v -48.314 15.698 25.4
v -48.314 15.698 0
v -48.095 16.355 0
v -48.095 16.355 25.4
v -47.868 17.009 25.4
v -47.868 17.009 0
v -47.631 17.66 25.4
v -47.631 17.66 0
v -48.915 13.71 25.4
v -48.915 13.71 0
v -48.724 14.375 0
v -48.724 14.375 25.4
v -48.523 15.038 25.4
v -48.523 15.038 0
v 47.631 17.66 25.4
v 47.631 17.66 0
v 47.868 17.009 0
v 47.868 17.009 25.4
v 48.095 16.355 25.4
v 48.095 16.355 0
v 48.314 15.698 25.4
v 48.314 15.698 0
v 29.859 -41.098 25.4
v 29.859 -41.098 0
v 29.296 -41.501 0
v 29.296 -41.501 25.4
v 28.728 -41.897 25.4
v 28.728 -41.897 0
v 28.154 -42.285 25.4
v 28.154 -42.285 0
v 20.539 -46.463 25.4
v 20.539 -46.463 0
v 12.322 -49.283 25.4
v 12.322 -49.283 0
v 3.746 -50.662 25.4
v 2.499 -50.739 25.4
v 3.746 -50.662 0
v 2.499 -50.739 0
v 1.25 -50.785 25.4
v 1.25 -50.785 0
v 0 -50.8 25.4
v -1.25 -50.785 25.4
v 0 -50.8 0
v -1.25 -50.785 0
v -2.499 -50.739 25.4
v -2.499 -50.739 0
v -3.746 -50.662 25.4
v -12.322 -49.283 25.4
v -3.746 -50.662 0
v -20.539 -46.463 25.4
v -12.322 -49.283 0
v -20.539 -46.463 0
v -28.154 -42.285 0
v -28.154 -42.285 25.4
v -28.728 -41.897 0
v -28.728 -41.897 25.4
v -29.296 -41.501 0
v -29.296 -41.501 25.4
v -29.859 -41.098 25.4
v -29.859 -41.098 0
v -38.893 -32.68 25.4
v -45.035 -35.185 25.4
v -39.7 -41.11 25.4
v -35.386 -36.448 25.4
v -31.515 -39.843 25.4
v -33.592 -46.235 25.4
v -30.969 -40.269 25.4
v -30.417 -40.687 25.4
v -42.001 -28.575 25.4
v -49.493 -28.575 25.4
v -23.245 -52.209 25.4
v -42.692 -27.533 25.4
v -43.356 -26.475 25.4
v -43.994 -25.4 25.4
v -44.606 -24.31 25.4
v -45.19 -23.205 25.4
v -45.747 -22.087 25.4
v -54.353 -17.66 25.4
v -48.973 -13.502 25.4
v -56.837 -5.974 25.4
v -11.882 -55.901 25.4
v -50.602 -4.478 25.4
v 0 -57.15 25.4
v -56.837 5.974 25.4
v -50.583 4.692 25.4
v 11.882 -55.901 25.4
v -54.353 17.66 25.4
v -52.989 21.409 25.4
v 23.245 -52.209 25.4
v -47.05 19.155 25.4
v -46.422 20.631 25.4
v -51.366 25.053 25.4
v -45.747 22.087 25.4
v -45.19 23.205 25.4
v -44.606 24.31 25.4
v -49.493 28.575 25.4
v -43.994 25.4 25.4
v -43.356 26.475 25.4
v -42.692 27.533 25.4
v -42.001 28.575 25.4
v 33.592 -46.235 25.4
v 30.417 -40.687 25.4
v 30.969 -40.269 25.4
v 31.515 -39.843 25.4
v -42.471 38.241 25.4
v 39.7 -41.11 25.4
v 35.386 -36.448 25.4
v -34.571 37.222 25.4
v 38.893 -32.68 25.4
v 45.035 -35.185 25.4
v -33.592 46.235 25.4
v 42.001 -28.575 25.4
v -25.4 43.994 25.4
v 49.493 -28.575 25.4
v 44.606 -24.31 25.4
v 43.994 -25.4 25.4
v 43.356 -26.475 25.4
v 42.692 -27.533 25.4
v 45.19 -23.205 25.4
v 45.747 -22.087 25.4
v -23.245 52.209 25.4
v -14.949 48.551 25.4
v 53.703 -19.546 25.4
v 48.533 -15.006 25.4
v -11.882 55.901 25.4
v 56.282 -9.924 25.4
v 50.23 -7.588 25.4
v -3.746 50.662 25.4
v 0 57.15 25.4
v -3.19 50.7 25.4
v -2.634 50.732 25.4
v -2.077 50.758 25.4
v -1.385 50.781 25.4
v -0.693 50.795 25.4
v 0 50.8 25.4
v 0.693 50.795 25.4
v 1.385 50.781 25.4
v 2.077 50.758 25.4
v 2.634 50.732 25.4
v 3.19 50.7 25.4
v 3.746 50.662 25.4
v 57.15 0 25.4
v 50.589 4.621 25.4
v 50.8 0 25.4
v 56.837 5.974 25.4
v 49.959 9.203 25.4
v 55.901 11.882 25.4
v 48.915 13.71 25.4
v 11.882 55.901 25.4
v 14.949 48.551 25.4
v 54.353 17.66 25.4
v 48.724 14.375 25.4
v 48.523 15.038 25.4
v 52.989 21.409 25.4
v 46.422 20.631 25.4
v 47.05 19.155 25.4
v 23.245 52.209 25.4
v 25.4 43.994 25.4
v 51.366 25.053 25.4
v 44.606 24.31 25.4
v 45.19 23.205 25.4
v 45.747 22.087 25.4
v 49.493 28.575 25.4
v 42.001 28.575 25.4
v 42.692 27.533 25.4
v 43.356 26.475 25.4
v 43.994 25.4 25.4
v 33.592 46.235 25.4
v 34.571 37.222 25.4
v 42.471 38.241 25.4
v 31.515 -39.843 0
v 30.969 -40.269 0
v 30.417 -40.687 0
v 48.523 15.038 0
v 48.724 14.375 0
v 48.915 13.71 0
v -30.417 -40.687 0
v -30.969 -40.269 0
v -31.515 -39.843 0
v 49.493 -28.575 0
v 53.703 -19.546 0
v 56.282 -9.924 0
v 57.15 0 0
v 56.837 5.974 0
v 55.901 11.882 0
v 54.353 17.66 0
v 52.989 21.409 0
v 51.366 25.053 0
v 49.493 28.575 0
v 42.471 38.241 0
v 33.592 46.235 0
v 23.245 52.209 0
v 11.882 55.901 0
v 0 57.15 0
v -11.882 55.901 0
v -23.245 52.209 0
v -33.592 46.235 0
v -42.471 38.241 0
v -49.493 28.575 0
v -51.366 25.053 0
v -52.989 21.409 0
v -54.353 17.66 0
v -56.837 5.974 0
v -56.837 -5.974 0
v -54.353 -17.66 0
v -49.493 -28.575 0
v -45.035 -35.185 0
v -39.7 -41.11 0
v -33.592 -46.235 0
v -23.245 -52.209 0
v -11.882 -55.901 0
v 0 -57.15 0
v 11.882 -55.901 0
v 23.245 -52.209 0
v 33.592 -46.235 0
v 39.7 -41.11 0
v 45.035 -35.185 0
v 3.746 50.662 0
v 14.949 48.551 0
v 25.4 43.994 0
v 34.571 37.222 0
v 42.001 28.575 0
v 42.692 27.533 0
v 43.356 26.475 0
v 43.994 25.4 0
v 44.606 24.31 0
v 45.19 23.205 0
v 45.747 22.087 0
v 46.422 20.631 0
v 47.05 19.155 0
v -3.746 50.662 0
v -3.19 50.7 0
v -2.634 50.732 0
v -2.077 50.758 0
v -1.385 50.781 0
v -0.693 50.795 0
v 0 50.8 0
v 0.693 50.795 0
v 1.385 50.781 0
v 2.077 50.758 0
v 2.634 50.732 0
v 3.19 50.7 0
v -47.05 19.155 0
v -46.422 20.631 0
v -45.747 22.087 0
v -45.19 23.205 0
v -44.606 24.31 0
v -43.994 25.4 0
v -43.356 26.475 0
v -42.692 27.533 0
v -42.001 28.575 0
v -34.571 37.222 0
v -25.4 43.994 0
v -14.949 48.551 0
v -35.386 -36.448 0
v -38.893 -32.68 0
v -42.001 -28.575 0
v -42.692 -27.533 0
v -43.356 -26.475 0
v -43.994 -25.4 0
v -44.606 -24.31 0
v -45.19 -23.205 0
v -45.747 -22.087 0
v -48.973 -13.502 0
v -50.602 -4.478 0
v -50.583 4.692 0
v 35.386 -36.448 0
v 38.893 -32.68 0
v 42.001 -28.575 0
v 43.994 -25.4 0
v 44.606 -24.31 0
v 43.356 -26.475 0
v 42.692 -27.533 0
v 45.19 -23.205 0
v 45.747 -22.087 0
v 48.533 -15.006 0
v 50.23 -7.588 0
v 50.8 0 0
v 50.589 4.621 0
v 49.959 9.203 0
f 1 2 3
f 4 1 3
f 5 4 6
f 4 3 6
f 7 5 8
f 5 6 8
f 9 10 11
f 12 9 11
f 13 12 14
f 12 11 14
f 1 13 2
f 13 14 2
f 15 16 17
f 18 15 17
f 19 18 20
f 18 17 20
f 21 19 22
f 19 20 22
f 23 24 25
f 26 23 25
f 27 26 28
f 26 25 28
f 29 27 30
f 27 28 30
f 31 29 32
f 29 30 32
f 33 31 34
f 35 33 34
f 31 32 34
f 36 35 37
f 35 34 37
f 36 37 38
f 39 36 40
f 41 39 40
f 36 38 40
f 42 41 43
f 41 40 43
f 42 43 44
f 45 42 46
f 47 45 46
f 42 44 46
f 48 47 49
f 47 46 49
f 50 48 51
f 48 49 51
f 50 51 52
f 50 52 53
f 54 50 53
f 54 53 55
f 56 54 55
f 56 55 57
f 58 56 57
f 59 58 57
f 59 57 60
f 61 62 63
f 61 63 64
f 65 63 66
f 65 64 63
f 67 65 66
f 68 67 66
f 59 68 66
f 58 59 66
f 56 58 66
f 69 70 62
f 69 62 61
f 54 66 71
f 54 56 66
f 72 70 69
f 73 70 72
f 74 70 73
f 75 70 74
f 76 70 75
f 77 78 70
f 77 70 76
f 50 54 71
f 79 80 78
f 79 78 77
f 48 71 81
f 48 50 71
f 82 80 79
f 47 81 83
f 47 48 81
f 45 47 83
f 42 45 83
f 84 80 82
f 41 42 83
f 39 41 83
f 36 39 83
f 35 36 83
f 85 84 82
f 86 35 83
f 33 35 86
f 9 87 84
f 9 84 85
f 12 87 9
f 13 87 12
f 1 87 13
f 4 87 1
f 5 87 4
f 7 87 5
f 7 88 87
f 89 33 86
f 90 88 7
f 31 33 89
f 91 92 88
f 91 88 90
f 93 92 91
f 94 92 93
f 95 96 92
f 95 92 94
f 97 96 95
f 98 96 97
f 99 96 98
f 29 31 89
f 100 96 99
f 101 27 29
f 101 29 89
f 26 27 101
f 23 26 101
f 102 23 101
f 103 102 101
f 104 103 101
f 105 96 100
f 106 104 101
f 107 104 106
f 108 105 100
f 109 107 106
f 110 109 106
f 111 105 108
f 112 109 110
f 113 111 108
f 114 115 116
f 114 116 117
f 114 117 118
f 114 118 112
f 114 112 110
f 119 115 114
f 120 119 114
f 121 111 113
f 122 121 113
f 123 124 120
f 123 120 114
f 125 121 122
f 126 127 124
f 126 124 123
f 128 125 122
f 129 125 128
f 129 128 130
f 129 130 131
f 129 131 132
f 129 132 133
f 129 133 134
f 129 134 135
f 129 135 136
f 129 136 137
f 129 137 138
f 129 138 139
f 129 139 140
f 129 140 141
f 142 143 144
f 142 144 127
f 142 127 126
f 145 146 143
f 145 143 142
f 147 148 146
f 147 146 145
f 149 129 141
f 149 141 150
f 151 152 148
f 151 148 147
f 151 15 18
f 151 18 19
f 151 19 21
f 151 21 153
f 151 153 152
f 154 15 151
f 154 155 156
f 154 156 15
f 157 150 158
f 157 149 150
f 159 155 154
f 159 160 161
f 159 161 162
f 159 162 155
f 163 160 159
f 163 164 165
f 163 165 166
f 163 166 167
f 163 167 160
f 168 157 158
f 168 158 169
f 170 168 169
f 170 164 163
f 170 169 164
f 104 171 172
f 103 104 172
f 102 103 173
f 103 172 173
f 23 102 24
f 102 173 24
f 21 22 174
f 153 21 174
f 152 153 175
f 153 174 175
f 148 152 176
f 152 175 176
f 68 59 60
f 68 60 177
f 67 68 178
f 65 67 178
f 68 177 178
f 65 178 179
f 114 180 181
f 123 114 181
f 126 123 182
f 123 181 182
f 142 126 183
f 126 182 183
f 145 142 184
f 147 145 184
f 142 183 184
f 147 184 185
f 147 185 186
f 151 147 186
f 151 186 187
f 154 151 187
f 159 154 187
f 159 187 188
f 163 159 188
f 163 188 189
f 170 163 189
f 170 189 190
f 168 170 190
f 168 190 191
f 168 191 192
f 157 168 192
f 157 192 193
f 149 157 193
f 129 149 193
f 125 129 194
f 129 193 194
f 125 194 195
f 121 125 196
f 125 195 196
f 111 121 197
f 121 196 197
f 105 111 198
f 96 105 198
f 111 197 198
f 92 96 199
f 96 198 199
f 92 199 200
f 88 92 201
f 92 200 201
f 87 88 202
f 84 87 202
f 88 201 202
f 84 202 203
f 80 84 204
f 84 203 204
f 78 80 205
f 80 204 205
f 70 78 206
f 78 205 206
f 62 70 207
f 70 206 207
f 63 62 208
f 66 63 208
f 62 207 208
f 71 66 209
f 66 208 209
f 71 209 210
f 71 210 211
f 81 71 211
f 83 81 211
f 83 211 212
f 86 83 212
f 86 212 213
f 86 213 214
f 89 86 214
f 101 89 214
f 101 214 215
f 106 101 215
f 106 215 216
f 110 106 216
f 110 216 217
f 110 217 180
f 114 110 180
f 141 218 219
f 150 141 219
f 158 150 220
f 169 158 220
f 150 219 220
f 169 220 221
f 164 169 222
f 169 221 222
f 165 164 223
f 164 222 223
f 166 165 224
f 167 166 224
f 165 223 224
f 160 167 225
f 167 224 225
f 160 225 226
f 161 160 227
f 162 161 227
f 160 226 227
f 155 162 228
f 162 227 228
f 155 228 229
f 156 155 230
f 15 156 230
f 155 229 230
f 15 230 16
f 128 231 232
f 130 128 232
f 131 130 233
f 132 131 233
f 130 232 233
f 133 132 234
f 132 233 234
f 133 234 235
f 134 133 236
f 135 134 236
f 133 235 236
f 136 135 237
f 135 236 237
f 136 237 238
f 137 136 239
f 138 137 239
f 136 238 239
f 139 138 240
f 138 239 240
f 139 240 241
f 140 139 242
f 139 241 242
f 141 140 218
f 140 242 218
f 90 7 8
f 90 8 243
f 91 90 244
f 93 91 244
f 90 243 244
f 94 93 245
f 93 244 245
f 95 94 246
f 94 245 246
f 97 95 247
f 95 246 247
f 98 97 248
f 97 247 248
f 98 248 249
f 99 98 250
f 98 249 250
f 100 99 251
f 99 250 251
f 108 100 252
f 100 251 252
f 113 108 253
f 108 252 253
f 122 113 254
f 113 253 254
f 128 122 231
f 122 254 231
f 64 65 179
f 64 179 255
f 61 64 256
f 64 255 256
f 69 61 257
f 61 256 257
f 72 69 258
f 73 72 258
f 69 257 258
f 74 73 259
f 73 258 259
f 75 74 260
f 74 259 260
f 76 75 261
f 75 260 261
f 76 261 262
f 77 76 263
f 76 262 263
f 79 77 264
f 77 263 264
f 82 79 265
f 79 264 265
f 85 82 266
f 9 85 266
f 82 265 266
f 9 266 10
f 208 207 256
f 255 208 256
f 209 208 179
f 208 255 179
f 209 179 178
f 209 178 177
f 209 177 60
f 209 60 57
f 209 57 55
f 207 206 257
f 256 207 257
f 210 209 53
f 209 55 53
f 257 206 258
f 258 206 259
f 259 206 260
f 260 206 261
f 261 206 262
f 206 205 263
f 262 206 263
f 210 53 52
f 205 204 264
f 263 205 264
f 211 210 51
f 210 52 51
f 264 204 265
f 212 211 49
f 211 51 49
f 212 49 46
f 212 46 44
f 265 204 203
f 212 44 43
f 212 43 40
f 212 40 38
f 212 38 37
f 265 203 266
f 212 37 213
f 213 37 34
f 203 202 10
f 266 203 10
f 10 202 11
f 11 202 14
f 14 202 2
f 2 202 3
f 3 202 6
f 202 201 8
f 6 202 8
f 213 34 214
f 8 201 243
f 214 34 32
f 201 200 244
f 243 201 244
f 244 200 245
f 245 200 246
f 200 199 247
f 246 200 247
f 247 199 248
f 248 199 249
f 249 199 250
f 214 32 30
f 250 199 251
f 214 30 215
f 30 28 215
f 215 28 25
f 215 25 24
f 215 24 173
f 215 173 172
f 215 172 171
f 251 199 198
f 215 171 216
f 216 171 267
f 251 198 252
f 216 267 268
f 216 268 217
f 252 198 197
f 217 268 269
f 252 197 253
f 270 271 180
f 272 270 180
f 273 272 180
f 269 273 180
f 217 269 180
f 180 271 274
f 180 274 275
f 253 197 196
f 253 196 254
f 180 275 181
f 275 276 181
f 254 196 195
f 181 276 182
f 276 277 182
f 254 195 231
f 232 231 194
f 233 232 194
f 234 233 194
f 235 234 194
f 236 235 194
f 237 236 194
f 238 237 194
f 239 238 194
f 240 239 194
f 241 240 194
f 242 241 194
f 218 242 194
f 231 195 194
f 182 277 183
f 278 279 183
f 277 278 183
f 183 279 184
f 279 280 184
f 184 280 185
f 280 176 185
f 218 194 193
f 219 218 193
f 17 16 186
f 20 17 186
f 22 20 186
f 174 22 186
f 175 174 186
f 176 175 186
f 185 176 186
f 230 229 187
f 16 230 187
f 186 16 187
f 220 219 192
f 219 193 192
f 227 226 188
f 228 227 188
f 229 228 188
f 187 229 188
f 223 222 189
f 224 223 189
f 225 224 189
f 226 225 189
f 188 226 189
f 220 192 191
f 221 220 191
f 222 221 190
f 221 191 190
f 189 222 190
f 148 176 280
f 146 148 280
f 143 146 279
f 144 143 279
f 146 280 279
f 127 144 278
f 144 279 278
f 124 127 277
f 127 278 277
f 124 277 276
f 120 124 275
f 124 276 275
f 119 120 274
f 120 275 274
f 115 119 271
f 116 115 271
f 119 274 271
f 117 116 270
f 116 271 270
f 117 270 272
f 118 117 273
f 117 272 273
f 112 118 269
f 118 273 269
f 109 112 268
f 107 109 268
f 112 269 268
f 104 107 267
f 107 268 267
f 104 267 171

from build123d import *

# Parameters (mm, degrees)
F1_DEPTH = 2.54
F2_DEPTH = 25.4


with BuildPart() as f1:
    # F0 (on Top) → F1 (new body)
    with BuildSketch(Plane.XY):
        with BuildLine():
            ThreePointArc((48.915112113, 13.7095516693), (50.3265719841, 6.9192595218), (50.8, 0))
            ThreePointArc((50.8, 0), (49.520723989, -11.328631674), (45.7473269447, -22.0866945787))
            Line((45.7473269447, -22.0866945787), (49.4933518263, -28.575))
            ThreePointArc((49.4933518263, -28.575), (55.2026609724, -14.7915084276), (57.15, 0))
            ThreePointArc((57.15, 0), (56.446388665, 8.940229677), (54.3528799063, 17.6603212285))
            Line((54.3528799063, 17.6603212285), (48.915112113, 13.7095516693))
        make_face()
        with BuildLine():
            ThreePointArc((48.3136710278, 15.6980633142), (48.624557709, 14.7068823209), (48.915112113, 13.7095516693))
            Line((48.915112113, 13.7095516693), (54.3528799063, 17.6603212285))
            Line((54.3528799063, 17.6603212285), (47.6314292679, 17.6603212285))
            ThreePointArc((47.6314292679, 17.6603212285), (47.982582066, 16.6826801888), (48.3136710278, 15.6980633142))
        make_face()
        with BuildLine():
            Line((49.4933518263, -28.575), (45.7473269447, -22.0866945787))
            ThreePointArc((45.7473269447, -22.0866945787), (44.9012806053, -23.759524406), (43.9940905122, -25.4))
            ThreePointArc((43.9940905122, -25.4), (43.0269920201, -27.0058874637), (42.0013020632, -28.575))
            Line((42.0013020631, -28.575), (49.4933518263, -28.575))
        make_face()
        with BuildLine():
            Line((47.6314292679, 17.6603212285), (54.3528799063, 17.6603212285))
            ThreePointArc((54.3528799063, 17.6603212285), (52.2091229043, 23.2449991518), (49.4933518263, 28.575))
            Line((49.4933518263, 28.575), (45.7473269447, 22.0866945787))
            ThreePointArc((45.7473269447, 22.0866945787), (46.7418038079, 19.895823099), (47.6314292679, 17.6603212285))
        make_face()
        with BuildLine():
            ThreePointArc((33.5919271685, -46.2353212285), (42.470726776, -38.2408141534), (49.4933518263, -28.575))
            Line((49.4933518263, -28.575), (42.0013020631, -28.575))
            ThreePointArc((42.0013020632, -28.575), (37.1873431903, -34.6084022522), (31.5148846944, -39.8428418))
            Line((31.5148846944, -39.8428418), (33.5919271685, -46.2353212285))
        make_face()
        with BuildLine():
            Line((42.0013020632, 28.575), (49.4933518263, 28.575))
            ThreePointArc((49.4933518263, 28.575), (28.575, 49.4933518263), (0, 57.15))
            Line((0, 57.15), (3.7460248816, 50.6616945787))
            ThreePointArc((3.7460248816, 50.6616945787), (25.4, 43.9940905122), (42.0013020632, 28.575))
        make_face()
        with BuildLine():
            Line((45.7473269447, 22.0866945787), (49.4933518263, 28.575))
            Line((49.4933518263, 28.575), (42.0013020632, 28.575))
            ThreePointArc((42.0013020632, 28.575), (43.0269920201, 27.0058874637), (43.9940905122, 25.4))
            ThreePointArc((43.9940905122, 25.4), (44.9012806053, 23.759524406), (45.7473269447, 22.0866945787))
        make_face()
        with BuildLine():
            Line((28.1541593752, -42.2845516693), (33.5919271685, -46.2353212285))
            Line((33.5919271685, -46.2353212285), (31.5148846944, -39.8428418))
            ThreePointArc((31.5148846944, -39.8428418), (30.6936049952, -40.4789156525), (29.8594908165, -41.0980633142))
            ThreePointArc((29.8594908165, -41.0980633142), (29.0128909417, -41.7000258897), (28.1541593752, -42.2845516693))
        make_face()
        with BuildLine():
            ThreePointArc((0, -57.15), (17.6603212285, -54.3528799063), (33.5919271685, -46.2353212285))
            Line((33.5919271685, -46.2353212285), (28.1541593752, -42.2845516693))
            ThreePointArc((28.1541593752, -42.2845516693), (16.4908935396, -48.0488338075), (3.7460248816, -50.6616945787))
            Line((3.7460248816, -50.6616945787), (0, -57.15))
        make_face()
        with BuildLine():
            Line((-3.7460248816, 50.6616945787), (0, 57.15))
            ThreePointArc((0, 57.15), (-28.575, 49.4933518263), (-49.4933518263, 28.575))
            Line((-49.4933518263, 28.575), (-42.0013020632, 28.575))
            ThreePointArc((-42.0013020632, 28.575), (-25.4, 43.9940905122), (-3.7460248816, 50.6616945787))
        make_face()
        with BuildLine():
            Line((2.0770424741, 50.7575205714), (0, 57.15))
            Line((0, 57.15), (-2.0770424741, 50.7575205714))
            ThreePointArc((-2.0770424741, 50.7575205714), (-1.0387384104, 50.7893790326), (0, 50.8))
            ThreePointArc((0, 50.8), (1.0387384104, 50.7893790326), (2.0770424741, 50.7575205714))
        make_face()
        with BuildLine():
            Line((3.7460248816, 50.6616945787), (0, 57.15))
            Line((0, 57.15), (2.0770424741, 50.7575205714))
            ThreePointArc((2.0770424741, 50.7575205714), (2.9119278858, 50.7164734183), (3.7460248816, 50.6616945787))
        make_face()
        with BuildLine():
            Line((-2.0770424741, 50.7575205714), (0, 57.15))
            Line((0, 57.15), (-3.7460248816, 50.6616945787))
            ThreePointArc((-3.7460248816, 50.6616945787), (-2.9119278858, 50.7164734183), (-2.0770424741, 50.7575205714))
        make_face()
        with BuildLine():
            ThreePointArc((-33.5919271685, -46.2353212285), (-17.6603212285, -54.3528799063), (0, -57.15))
            Line((0, -57.15), (-3.7460248816, -50.6616945787))
            ThreePointArc((-3.7460248816, -50.6616945787), (-16.4908935396, -48.0488338075), (-28.1541593752, -42.2845516693))
            Line((-28.1541593752, -42.2845516693), (-33.5919271685, -46.2353212285))
        make_face()
        with BuildLine():
            Line((-3.7460248816, -50.6616945787), (0, -57.15))
            Line((0, -57.15), (3.7460248816, -50.6616945787))
            ThreePointArc((3.7460248816, -50.6616945787), (1.8742885852, -50.7654118697), (0, -50.8))
            ThreePointArc((0, -50.8), (-1.8742885852, -50.7654118697), (-3.7460248816, -50.6616945787))
        make_face()
        with BuildLine():
            Line((-45.7473269447, 22.0866945787), (-49.4933518263, 28.575))
            ThreePointArc((-49.4933518263, 28.575), (-52.2091229043, 23.2449991518), (-54.3528799063, 17.6603212285))
            Line((-54.3528799063, 17.6603212285), (-47.6314292679, 17.6603212285))
            ThreePointArc((-47.6314292679, 17.6603212285), (-46.7418038079, 19.895823099), (-45.7473269447, 22.0866945787))
        make_face()
        with BuildLine():
            Line((-42.0013020632, 28.575), (-49.4933518263, 28.575))
            Line((-49.4933518263, 28.575), (-45.7473269447, 22.0866945787))
            ThreePointArc((-45.7473269447, 22.0866945787), (-44.9012806053, 23.759524406), (-43.9940905122, 25.4))
            ThreePointArc((-43.9940905122, 25.4), (-43.0269920201, 27.0058874637), (-42.0013020632, 28.575))
        make_face()
        with BuildLine():
            Line((-31.5148846944, -39.8428418), (-33.5919271685, -46.2353212285))
            Line((-33.5919271685, -46.2353212285), (-28.1541593752, -42.2845516693))
            ThreePointArc((-28.1541593752, -42.2845516693), (-29.0128909417, -41.7000258897), (-29.8594908165, -41.0980633142))
            ThreePointArc((-29.8594908165, -41.0980633142), (-30.6936049952, -40.4789156525), (-31.5148846944, -39.8428418))
        make_face()
        with BuildLine():
            ThreePointArc((-49.4933518263, -28.575), (-42.470726776, -38.2408141534), (-33.5919271685, -46.2353212285))
            Line((-33.5919271685, -46.2353212285), (-31.5148846944, -39.8428418))
            ThreePointArc((-31.5148846944, -39.8428418), (-37.1873431903, -34.6084022522), (-42.0013020632, -28.575))
            Line((-42.0013020631, -28.575), (-49.4933518263, -28.575))
        make_face()
        with BuildLine():
            Line((-48.915112113, 13.7095516693), (-54.3528799063, 17.6603212285))
            ThreePointArc((-54.3528799063, 17.6603212285), (-56.8369263203, -5.9738016757), (-49.4933518263, -28.575))
            Line((-49.4933518263, -28.575), (-45.7473269447, -22.0866945787))
            ThreePointArc((-45.7473269447, -22.0866945787), (-50.6022445495, -4.478040481), (-48.915112113, 13.7095516693))
        make_face()
        with BuildLine():
            Line((-47.6314292679, 17.6603212285), (-54.3528799063, 17.6603212285))
            Line((-54.3528799063, 17.6603212285), (-48.915112113, 13.7095516693))
            ThreePointArc((-48.915112113, 13.7095516693), (-48.624557709, 14.7068823209), (-48.3136710278, 15.6980633142))
            ThreePointArc((-48.3136710278, 15.6980633142), (-47.982582066, 16.6826801888), (-47.6314292679, 17.6603212285))
        make_face()
        with BuildLine():
            Line((-45.7473269447, -22.0866945787), (-49.4933518263, -28.575))
            Line((-49.4933518263, -28.575), (-42.0013020631, -28.575))
            ThreePointArc((-42.0013020632, -28.575), (-43.0269920201, -27.0058874637), (-43.9940905122, -25.4))
            ThreePointArc((-43.9940905122, -25.4), (-44.9012806053, -23.759524406), (-45.7473269447, -22.0866945787))
        make_face()
    extrude(amount=F1_DEPTH)

    # F0 (on Top) → F2 (join)
    with BuildSketch(Plane.XY):
        with BuildLine():
            ThreePointArc((48.915112113, 13.7095516693), (50.3265719841, 6.9192595218), (50.8, 0))
            ThreePointArc((50.8, 0), (49.520723989, -11.328631674), (45.7473269447, -22.0866945787))
            Line((45.7473269447, -22.0866945787), (49.4933518263, -28.575))
            ThreePointArc((49.4933518263, -28.575), (55.2026609724, -14.7915084276), (57.15, 0))
            ThreePointArc((57.15, 0), (56.446388665, 8.940229677), (54.3528799063, 17.6603212285))
            Line((54.3528799063, 17.6603212285), (48.915112113, 13.7095516693))
        make_face()
        with BuildLine():
            ThreePointArc((48.3136710278, 15.6980633142), (48.624557709, 14.7068823209), (48.915112113, 13.7095516693))
            Line((48.915112113, 13.7095516693), (54.3528799063, 17.6603212285))
            Line((54.3528799063, 17.6603212285), (47.6314292679, 17.6603212285))
            ThreePointArc((47.6314292679, 17.6603212285), (47.982582066, 16.6826801888), (48.3136710278, 15.6980633142))
        make_face()
        with BuildLine():
            Line((49.4933518263, -28.575), (45.7473269447, -22.0866945787))
            ThreePointArc((45.7473269447, -22.0866945787), (44.9012806053, -23.759524406), (43.9940905122, -25.4))
            ThreePointArc((43.9940905122, -25.4), (43.0269920201, -27.0058874637), (42.0013020632, -28.575))
            Line((42.0013020631, -28.575), (49.4933518263, -28.575))
        make_face()
        with BuildLine():
            Line((47.6314292679, 17.6603212285), (54.3528799063, 17.6603212285))
            ThreePointArc((54.3528799063, 17.6603212285), (52.2091229043, 23.2449991518), (49.4933518263, 28.575))
            Line((49.4933518263, 28.575), (45.7473269447, 22.0866945787))
            ThreePointArc((45.7473269447, 22.0866945787), (46.7418038079, 19.895823099), (47.6314292679, 17.6603212285))
        make_face()
        with BuildLine():
            ThreePointArc((33.5919271685, -46.2353212285), (42.470726776, -38.2408141534), (49.4933518263, -28.575))
            Line((49.4933518263, -28.575), (42.0013020631, -28.575))
            ThreePointArc((42.0013020632, -28.575), (37.1873431903, -34.6084022522), (31.5148846944, -39.8428418))
            Line((31.5148846944, -39.8428418), (33.5919271685, -46.2353212285))
        make_face()
        with BuildLine():
            Line((42.0013020632, 28.575), (49.4933518263, 28.575))
            ThreePointArc((49.4933518263, 28.575), (28.575, 49.4933518263), (0, 57.15))
            Line((0, 57.15), (3.7460248816, 50.6616945787))
            ThreePointArc((3.7460248816, 50.6616945787), (25.4, 43.9940905122), (42.0013020632, 28.575))
        make_face()
        with BuildLine():
            Line((45.7473269447, 22.0866945787), (49.4933518263, 28.575))
            Line((49.4933518263, 28.575), (42.0013020632, 28.575))
            ThreePointArc((42.0013020632, 28.575), (43.0269920201, 27.0058874637), (43.9940905122, 25.4))
            ThreePointArc((43.9940905122, 25.4), (44.9012806053, 23.759524406), (45.7473269447, 22.0866945787))
        make_face()
        with BuildLine():
            Line((28.1541593752, -42.2845516693), (33.5919271685, -46.2353212285))
            Line((33.5919271685, -46.2353212285), (31.5148846944, -39.8428418))
            ThreePointArc((31.5148846944, -39.8428418), (30.6936049952, -40.4789156525), (29.8594908165, -41.0980633142))
            ThreePointArc((29.8594908165, -41.0980633142), (29.0128909417, -41.7000258897), (28.1541593752, -42.2845516693))
        make_face()
        with BuildLine():
            ThreePointArc((0, -57.15), (17.6603212285, -54.3528799063), (33.5919271685, -46.2353212285))
            Line((33.5919271685, -46.2353212285), (28.1541593752, -42.2845516693))
            ThreePointArc((28.1541593752, -42.2845516693), (16.4908935396, -48.0488338075), (3.7460248816, -50.6616945787))
            Line((3.7460248816, -50.6616945787), (0, -57.15))
        make_face()
        with BuildLine():
            Line((-3.7460248816, 50.6616945787), (0, 57.15))
            ThreePointArc((0, 57.15), (-28.575, 49.4933518263), (-49.4933518263, 28.575))
            Line((-49.4933518263, 28.575), (-42.0013020632, 28.575))
            ThreePointArc((-42.0013020632, 28.575), (-25.4, 43.9940905122), (-3.7460248816, 50.6616945787))
        make_face()
        with BuildLine():
            Line((2.0770424741, 50.7575205714), (0, 57.15))
            Line((0, 57.15), (-2.0770424741, 50.7575205714))
            ThreePointArc((-2.0770424741, 50.7575205714), (-1.0387384104, 50.7893790326), (0, 50.8))
            ThreePointArc((0, 50.8), (1.0387384104, 50.7893790326), (2.0770424741, 50.7575205714))
        make_face()
        with BuildLine():
            Line((3.7460248816, 50.6616945787), (0, 57.15))
            Line((0, 57.15), (2.0770424741, 50.7575205714))
            ThreePointArc((2.0770424741, 50.7575205714), (2.9119278858, 50.7164734183), (3.7460248816, 50.6616945787))
        make_face()
        with BuildLine():
            Line((-2.0770424741, 50.7575205714), (0, 57.15))
            Line((0, 57.15), (-3.7460248816, 50.6616945787))
            ThreePointArc((-3.7460248816, 50.6616945787), (-2.9119278858, 50.7164734183), (-2.0770424741, 50.7575205714))
        make_face()
        with BuildLine():
            ThreePointArc((-33.5919271685, -46.2353212285), (-17.6603212285, -54.3528799063), (0, -57.15))
            Line((0, -57.15), (-3.7460248816, -50.6616945787))
            ThreePointArc((-3.7460248816, -50.6616945787), (-16.4908935396, -48.0488338075), (-28.1541593752, -42.2845516693))
            Line((-28.1541593752, -42.2845516693), (-33.5919271685, -46.2353212285))
        make_face()
        with BuildLine():
            Line((-3.7460248816, -50.6616945787), (0, -57.15))
            Line((0, -57.15), (3.7460248816, -50.6616945787))
            ThreePointArc((3.7460248816, -50.6616945787), (1.8742885852, -50.7654118697), (0, -50.8))
            ThreePointArc((0, -50.8), (-1.8742885852, -50.7654118697), (-3.7460248816, -50.6616945787))
        make_face()
        with BuildLine():
            Line((-45.7473269447, 22.0866945787), (-49.4933518263, 28.575))
            ThreePointArc((-49.4933518263, 28.575), (-52.2091229043, 23.2449991518), (-54.3528799063, 17.6603212285))
            Line((-54.3528799063, 17.6603212285), (-47.6314292679, 17.6603212285))
            ThreePointArc((-47.6314292679, 17.6603212285), (-46.7418038079, 19.895823099), (-45.7473269447, 22.0866945787))
        make_face()
        with BuildLine():
            Line((-42.0013020632, 28.575), (-49.4933518263, 28.575))
            Line((-49.4933518263, 28.575), (-45.7473269447, 22.0866945787))
            ThreePointArc((-45.7473269447, 22.0866945787), (-44.9012806053, 23.759524406), (-43.9940905122, 25.4))
            ThreePointArc((-43.9940905122, 25.4), (-43.0269920201, 27.0058874637), (-42.0013020632, 28.575))
        make_face()
        with BuildLine():
            Line((-31.5148846944, -39.8428418), (-33.5919271685, -46.2353212285))
            Line((-33.5919271685, -46.2353212285), (-28.1541593752, -42.2845516693))
            ThreePointArc((-28.1541593752, -42.2845516693), (-29.0128909417, -41.7000258897), (-29.8594908165, -41.0980633142))
            ThreePointArc((-29.8594908165, -41.0980633142), (-30.6936049952, -40.4789156525), (-31.5148846944, -39.8428418))
        make_face()
        with BuildLine():
            ThreePointArc((-49.4933518263, -28.575), (-42.470726776, -38.2408141534), (-33.5919271685, -46.2353212285))
            Line((-33.5919271685, -46.2353212285), (-31.5148846944, -39.8428418))
            ThreePointArc((-31.5148846944, -39.8428418), (-37.1873431903, -34.6084022522), (-42.0013020632, -28.575))
            Line((-42.0013020631, -28.575), (-49.4933518263, -28.575))
        make_face()
        with BuildLine():
            Line((-48.915112113, 13.7095516693), (-54.3528799063, 17.6603212285))
            ThreePointArc((-54.3528799063, 17.6603212285), (-56.8369263203, -5.9738016757), (-49.4933518263, -28.575))
            Line((-49.4933518263, -28.575), (-45.7473269447, -22.0866945787))
            ThreePointArc((-45.7473269447, -22.0866945787), (-50.6022445495, -4.478040481), (-48.915112113, 13.7095516693))
        make_face()
        with BuildLine():
            Line((-47.6314292679, 17.6603212285), (-54.3528799063, 17.6603212285))
            Line((-54.3528799063, 17.6603212285), (-48.915112113, 13.7095516693))
            ThreePointArc((-48.915112113, 13.7095516693), (-48.624557709, 14.7068823209), (-48.3136710278, 15.6980633142))
            ThreePointArc((-48.3136710278, 15.6980633142), (-47.982582066, 16.6826801888), (-47.6314292679, 17.6603212285))
        make_face()
        with BuildLine():
            Line((-45.7473269447, -22.0866945787), (-49.4933518263, -28.575))
            Line((-49.4933518263, -28.575), (-42.0013020631, -28.575))
            ThreePointArc((-42.0013020632, -28.575), (-43.0269920201, -27.0058874637), (-43.9940905122, -25.4))
            ThreePointArc((-43.9940905122, -25.4), (-44.9012806053, -23.759524406), (-45.7473269447, -22.0866945787))
        make_face()
    extrude(amount=F2_DEPTH)


solid = f1.part
